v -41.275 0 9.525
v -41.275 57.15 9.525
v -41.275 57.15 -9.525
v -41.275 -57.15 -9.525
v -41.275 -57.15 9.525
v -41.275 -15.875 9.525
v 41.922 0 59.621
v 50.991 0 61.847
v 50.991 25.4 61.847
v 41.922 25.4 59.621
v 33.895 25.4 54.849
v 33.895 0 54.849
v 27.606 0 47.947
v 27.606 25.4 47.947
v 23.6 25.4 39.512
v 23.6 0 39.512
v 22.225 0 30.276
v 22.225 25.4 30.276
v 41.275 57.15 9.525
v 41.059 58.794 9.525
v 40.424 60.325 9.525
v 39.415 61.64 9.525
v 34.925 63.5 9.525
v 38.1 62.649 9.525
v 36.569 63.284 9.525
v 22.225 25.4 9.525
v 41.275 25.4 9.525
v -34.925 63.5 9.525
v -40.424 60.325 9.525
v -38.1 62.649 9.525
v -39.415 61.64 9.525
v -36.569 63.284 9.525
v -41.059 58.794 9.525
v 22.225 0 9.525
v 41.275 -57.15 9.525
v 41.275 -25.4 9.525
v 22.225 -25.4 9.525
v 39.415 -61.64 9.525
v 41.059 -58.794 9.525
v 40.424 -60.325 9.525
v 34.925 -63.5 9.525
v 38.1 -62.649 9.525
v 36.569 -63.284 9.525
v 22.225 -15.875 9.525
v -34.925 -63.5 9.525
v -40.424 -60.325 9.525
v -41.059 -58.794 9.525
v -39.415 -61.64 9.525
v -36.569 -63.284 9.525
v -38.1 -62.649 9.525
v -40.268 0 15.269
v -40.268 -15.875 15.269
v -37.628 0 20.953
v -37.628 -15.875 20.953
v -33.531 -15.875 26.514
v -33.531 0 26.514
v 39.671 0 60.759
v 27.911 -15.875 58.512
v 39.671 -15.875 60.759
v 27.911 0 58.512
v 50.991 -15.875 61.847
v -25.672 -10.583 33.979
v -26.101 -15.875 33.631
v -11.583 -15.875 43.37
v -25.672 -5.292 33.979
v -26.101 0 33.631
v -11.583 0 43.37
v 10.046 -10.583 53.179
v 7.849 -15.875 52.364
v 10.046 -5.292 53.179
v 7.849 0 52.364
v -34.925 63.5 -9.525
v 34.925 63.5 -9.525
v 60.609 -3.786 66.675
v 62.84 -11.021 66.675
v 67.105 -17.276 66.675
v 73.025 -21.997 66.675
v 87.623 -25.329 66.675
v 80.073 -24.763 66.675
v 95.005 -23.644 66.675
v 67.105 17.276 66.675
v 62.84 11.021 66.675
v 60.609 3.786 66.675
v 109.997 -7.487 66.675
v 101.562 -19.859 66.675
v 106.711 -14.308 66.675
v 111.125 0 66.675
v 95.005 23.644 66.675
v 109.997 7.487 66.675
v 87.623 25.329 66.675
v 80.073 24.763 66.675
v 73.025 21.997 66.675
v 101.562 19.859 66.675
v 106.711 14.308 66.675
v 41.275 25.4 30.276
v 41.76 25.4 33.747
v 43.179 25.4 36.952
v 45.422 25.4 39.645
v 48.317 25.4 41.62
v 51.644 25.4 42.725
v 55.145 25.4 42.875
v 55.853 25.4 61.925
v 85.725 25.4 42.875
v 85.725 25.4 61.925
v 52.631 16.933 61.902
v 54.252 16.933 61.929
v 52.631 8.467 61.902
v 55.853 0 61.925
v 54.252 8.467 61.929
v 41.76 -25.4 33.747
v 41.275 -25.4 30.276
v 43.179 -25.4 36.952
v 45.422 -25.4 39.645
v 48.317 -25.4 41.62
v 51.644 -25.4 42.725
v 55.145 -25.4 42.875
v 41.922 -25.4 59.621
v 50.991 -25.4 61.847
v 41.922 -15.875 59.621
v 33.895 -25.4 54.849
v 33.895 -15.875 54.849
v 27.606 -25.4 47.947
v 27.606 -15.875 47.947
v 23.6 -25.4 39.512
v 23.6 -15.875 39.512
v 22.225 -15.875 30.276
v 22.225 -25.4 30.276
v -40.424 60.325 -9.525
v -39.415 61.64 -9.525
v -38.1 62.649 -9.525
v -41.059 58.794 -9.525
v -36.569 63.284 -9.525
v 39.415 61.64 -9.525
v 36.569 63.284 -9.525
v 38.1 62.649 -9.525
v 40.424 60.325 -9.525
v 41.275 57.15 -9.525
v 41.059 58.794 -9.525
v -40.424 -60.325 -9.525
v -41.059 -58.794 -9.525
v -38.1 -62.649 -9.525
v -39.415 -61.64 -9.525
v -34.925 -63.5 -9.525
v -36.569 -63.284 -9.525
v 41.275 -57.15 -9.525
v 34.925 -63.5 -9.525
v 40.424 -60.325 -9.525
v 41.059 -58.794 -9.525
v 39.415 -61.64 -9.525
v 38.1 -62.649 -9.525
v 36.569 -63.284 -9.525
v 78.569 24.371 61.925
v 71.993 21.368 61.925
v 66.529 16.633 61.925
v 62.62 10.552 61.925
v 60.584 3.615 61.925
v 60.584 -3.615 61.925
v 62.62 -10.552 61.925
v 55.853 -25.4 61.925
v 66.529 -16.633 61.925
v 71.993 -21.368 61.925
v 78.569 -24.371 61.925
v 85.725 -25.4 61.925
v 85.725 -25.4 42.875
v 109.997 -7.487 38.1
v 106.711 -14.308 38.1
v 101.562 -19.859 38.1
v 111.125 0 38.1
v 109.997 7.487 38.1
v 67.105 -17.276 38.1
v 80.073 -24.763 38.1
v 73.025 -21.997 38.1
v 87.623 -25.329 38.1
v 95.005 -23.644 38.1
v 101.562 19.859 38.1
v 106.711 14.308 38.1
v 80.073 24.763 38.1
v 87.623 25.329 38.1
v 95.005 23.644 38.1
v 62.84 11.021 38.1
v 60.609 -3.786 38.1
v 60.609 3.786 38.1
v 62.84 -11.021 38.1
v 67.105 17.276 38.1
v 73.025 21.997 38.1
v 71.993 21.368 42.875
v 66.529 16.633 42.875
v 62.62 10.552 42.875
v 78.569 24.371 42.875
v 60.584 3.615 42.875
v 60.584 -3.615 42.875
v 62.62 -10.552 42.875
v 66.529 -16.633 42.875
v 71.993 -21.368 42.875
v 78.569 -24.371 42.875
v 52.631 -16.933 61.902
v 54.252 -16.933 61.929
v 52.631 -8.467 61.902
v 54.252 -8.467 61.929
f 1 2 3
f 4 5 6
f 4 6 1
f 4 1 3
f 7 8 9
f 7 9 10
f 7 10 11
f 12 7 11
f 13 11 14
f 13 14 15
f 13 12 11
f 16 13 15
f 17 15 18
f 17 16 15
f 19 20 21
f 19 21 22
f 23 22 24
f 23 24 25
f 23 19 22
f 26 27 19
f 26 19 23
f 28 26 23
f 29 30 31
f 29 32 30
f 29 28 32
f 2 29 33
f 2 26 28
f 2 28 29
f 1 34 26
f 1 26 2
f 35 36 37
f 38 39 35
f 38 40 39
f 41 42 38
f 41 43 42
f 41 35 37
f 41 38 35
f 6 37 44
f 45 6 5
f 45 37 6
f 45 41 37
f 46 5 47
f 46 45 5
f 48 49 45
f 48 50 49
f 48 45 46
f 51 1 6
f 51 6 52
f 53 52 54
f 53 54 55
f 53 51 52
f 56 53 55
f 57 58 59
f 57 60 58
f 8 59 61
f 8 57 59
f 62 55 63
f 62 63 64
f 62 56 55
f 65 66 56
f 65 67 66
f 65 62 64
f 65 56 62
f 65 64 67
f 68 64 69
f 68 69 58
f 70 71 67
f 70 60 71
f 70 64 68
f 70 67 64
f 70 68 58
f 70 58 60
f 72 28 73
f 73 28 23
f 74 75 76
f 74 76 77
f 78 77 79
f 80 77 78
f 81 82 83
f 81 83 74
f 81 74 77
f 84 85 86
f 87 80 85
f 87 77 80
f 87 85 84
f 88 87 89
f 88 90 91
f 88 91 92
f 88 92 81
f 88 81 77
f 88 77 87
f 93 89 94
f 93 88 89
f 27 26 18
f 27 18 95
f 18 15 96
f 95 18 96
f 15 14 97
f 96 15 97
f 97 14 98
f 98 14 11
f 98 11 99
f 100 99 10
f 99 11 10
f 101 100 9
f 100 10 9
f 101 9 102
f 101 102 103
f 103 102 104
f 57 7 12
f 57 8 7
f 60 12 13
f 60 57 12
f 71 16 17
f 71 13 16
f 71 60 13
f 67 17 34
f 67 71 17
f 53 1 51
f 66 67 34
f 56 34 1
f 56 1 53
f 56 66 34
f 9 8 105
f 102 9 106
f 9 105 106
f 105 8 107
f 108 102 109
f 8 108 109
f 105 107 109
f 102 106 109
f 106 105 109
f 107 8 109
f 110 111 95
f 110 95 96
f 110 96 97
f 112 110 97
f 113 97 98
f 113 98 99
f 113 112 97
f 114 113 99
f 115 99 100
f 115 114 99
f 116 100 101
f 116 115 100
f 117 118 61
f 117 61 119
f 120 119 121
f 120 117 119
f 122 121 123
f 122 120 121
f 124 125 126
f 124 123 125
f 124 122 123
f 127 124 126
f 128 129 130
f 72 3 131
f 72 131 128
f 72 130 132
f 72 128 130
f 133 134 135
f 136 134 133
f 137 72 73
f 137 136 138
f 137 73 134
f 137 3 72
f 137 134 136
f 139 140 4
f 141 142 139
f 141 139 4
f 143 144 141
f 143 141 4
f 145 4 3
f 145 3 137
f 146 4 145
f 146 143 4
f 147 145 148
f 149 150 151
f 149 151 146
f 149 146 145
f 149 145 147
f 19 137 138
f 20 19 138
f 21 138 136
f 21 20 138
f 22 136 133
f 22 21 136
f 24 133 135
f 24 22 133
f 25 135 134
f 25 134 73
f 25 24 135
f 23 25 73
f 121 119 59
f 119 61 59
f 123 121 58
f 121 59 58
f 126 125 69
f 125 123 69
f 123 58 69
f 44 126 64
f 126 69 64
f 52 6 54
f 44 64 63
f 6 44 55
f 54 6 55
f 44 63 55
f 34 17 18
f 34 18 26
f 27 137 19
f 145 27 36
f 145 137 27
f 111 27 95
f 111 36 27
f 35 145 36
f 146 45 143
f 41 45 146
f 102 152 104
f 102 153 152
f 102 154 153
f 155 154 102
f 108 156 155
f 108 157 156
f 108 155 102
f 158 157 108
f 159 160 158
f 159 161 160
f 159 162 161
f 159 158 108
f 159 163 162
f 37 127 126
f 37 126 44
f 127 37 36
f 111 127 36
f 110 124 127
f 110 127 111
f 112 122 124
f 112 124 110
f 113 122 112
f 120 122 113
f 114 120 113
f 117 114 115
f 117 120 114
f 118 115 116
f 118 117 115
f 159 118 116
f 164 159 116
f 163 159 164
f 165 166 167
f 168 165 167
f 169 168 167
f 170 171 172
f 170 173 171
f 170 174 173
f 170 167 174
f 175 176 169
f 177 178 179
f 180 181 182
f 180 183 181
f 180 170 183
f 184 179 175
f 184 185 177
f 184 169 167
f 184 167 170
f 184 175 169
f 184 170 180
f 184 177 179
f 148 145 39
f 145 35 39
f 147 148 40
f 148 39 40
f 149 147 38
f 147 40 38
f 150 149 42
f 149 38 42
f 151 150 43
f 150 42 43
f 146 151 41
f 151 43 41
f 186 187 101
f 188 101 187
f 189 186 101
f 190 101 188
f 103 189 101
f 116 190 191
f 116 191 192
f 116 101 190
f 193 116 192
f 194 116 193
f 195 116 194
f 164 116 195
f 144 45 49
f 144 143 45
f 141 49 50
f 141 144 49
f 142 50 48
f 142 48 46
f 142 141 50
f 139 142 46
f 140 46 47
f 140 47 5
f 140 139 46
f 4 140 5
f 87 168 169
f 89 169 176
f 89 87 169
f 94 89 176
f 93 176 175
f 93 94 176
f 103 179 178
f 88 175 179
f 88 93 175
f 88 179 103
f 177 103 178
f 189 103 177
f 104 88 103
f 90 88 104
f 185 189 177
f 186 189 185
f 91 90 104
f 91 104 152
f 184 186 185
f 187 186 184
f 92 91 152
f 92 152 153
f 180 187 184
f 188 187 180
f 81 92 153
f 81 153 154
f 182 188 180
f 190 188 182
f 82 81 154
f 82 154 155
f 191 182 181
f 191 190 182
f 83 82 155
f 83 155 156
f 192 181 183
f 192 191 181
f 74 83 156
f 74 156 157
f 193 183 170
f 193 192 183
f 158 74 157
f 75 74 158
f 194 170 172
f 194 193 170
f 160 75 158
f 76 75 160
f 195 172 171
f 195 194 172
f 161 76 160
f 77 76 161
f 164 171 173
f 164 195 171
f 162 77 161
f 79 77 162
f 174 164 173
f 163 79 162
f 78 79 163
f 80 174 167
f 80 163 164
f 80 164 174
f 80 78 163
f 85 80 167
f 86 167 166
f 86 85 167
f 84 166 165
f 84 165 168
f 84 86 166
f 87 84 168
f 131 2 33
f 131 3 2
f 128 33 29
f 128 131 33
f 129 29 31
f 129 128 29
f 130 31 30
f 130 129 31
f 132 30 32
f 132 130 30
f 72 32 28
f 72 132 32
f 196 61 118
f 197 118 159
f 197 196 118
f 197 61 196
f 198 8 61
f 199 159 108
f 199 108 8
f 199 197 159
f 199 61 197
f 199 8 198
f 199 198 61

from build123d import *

# Parameters (mm, degrees)
F1_DEPTH = 63.5
F2_DEPTH = 25.4
F3_DEPTH = 15.875
F5_R     = 6.35


with BuildPart() as f1:
    # F0 (on Front) → F1 (new body, symmetric)
    with BuildSketch(Plane.XZ):
        Polygon((22.225, 9.525), (-41.275, 9.525), (-41.275, -9.525), (41.275, -9.525), (41.275, 9.525), align=None)
    extrude(amount=F1_DEPTH, both=True)

    # F0 (on Front) → F2 (join, symmetric)
    with BuildSketch(Plane.XZ):
        with BuildLine():
            Line((22.225, 30.275552), (22.225, 9.525))
            Line((22.225, 9.525), (41.275, 9.525))
            Line((41.275, 9.525), (41.275, 30.275552))
            ThreePointArc((41.275, 30.275552), (45.421853, 39.644869), (55.145303, 42.8752))
            Line((55.145303, 42.8752), (60.325, 42.8752))
            Line((60.325, 42.8752), (60.325, 61.9252))
            Line((60.325, 61.9252), (55.853148, 61.9252))
            add(Edge.make_bspline(
                [(50.991166, 61.84665), (52.640021, 61.916743), (54.262423, 61.943544), (55.853148, 61.9252)],
                knots=[105.839839, 105.839839, 105.839839, 105.839839, 110.361488, 110.361488, 110.361488, 110.361488], degree=3))
            ThreePointArc((50.991166, 61.84665), (30.495036, 51.631035), (22.225, 30.275552))
        make_face()
        Polygon((85.725, 61.9252), (60.325, 61.9252), (60.325, 42.8752), (82.916974, 42.8752), (85.725, 42.8752), align=None)
    extrude(amount=F2_DEPTH, both=True)

    # F0 (on Front) → F3 (join)
    with BuildSketch(Plane.XZ):
        with BuildLine():
            add(Edge.make_bspline(
                [(-41.275, 9.525), (-40.69288, 34.845239), (12.395848, 60.205958), (50.991166, 61.84665)],
                knots=[0, 0, 0, 0, 105.839839, 105.839839, 105.839839, 105.839839], degree=3))
            Line((-41.275, 9.525), (22.225, 9.525))
            Line((22.225, 9.525), (22.225, 30.275552))
            ThreePointArc((22.225, 30.275552), (30.495036, 51.631035), (50.991166, 61.84665))
        make_face()
    extrude(amount=F3_DEPTH)

    # F0 (on Front) → F4 (revolve)
    with BuildSketch(Plane.XZ):
        Polygon((85.725, 66.675), (85.725, 61.9252), (85.725, 42.8752), (85.725, 38.1), (111.125, 38.1), (111.125, 66.675), align=None)
    revolve(axis=Axis((85.725, 0, 52.3875), (0, 0, 1)))

    # F5
    f5_edges = [f1.edges().sort_by_distance(p)[0] for p in [
        (41.275, -63.5, 0),
        (41.275, 63.5, 0),
        (-41.275, -63.5, 0),
        (-41.275, 63.5, 0),
    ]]
    fillet(f5_edges, radius=F5_R)


solid = f1.part
